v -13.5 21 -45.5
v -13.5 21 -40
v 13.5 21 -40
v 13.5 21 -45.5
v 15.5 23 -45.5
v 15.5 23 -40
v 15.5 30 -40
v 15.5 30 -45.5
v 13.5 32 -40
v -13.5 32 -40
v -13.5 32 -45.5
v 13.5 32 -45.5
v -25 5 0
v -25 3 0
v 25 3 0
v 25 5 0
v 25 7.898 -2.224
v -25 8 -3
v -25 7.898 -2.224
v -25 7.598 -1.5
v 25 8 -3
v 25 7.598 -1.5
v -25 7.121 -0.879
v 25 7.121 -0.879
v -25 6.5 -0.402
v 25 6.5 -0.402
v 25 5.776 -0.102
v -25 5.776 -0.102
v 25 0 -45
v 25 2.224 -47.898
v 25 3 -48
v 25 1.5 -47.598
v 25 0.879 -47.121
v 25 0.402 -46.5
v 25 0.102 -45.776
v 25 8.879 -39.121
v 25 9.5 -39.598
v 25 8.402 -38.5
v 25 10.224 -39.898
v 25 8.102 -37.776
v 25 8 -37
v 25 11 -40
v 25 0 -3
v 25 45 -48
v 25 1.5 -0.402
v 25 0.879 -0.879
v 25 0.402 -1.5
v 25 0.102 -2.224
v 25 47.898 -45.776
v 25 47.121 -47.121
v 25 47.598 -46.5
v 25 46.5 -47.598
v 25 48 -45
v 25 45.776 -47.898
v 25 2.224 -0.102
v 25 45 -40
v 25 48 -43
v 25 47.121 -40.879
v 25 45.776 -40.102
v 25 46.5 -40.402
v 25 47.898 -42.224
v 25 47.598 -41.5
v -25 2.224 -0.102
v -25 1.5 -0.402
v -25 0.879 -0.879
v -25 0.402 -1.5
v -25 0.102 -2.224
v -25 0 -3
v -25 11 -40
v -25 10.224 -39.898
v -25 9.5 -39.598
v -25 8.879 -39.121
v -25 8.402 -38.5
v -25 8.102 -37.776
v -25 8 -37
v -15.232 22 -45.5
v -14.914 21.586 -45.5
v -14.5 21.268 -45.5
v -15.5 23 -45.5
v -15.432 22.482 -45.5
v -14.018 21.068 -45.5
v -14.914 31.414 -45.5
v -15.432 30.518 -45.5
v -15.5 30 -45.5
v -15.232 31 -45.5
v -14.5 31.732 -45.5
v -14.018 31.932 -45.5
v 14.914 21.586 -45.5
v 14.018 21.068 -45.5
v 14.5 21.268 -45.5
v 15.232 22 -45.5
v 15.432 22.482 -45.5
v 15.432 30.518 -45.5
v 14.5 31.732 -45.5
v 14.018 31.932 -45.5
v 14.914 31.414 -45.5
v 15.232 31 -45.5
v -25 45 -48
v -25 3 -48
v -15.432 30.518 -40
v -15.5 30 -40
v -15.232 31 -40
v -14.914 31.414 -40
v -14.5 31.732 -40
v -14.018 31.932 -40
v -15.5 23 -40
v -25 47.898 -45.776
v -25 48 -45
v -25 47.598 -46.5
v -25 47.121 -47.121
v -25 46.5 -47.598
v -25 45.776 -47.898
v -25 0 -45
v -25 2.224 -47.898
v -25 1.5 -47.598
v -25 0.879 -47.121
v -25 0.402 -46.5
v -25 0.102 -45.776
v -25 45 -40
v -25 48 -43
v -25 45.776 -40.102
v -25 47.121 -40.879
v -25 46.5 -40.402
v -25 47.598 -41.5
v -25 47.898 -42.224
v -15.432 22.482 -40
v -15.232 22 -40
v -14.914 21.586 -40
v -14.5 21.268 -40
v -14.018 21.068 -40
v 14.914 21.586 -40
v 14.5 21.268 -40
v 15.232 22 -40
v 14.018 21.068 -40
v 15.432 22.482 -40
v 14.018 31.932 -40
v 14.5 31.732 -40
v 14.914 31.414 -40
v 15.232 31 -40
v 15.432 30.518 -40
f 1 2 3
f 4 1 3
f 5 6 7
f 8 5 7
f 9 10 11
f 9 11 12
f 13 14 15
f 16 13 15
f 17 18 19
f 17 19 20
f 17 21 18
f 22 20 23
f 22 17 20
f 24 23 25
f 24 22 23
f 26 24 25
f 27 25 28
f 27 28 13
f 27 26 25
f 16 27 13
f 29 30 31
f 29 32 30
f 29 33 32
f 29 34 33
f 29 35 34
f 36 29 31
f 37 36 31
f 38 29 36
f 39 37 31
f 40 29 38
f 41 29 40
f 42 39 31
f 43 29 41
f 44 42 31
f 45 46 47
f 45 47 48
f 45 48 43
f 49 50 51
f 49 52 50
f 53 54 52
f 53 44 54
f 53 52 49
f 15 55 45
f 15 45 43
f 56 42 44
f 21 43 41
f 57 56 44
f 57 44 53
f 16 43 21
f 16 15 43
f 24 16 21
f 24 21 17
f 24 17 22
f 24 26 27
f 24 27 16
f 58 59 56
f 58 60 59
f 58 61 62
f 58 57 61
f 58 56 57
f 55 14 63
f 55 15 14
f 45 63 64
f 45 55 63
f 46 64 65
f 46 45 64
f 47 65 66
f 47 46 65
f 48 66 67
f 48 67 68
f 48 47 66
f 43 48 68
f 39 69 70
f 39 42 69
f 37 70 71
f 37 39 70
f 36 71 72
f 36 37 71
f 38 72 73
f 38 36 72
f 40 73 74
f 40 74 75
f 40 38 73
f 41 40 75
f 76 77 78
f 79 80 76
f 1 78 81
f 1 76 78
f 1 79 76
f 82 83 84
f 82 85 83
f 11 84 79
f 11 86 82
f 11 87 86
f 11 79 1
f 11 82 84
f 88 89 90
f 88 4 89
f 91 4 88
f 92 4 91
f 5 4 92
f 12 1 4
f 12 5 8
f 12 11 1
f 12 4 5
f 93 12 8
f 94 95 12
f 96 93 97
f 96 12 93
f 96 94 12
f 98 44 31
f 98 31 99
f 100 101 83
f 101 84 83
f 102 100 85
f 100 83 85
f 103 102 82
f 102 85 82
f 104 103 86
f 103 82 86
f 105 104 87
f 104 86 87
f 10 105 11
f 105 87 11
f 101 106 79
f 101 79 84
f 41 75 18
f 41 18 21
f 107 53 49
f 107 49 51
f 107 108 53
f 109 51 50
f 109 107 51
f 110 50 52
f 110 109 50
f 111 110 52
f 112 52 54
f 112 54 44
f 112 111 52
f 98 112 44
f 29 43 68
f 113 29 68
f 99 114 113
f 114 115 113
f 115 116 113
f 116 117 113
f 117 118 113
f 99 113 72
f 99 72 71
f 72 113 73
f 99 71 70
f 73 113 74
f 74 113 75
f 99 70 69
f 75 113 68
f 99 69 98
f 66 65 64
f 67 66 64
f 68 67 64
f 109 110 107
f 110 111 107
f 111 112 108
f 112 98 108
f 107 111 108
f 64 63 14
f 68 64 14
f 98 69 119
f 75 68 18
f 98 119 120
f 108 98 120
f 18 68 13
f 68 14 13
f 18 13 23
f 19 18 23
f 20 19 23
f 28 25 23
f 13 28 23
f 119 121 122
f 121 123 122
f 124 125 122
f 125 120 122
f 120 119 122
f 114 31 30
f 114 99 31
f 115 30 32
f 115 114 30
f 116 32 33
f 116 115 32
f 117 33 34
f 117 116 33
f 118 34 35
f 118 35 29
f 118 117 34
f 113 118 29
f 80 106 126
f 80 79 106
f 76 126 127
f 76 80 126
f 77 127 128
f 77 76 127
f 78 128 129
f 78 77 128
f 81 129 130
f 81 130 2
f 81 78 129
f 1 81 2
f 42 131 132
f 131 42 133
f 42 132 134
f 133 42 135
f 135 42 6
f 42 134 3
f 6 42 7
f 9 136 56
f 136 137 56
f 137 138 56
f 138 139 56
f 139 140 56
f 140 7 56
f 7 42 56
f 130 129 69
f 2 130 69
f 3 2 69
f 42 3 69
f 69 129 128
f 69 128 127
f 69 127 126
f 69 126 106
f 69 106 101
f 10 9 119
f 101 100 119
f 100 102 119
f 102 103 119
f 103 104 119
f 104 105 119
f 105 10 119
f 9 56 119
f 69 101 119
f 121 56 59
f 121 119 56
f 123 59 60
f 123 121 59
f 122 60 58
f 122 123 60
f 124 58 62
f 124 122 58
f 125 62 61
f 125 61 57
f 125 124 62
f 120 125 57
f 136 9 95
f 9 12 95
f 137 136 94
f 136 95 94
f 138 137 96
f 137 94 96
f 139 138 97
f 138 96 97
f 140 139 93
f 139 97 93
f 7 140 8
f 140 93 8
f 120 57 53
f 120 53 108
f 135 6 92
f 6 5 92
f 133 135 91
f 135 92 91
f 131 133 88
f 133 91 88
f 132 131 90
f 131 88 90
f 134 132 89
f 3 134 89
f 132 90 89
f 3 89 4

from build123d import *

# Parameters (mm, degrees)
SKETCH1_W           = 50
SKETCH1_H           = 40
BOSS_EXTRUDE1_DEPTH = 8
SKETCH2_W           = 50
SKETCH2_H           = 48
BOSS_EXTRUDE2_DEPTH = 8
SKETCH3_W           = 31
SKETCH3_H           = 11
CUT_EXTRUDE1_DEPTH  = 5.5
FILLET1_R           = 2
FILLET2_R           = 3


with BuildPart() as part:
    # Sketch1 → Boss-Extrude1 (new body)
    with BuildSketch(Plane(origin=(0, 0, 0), x_dir=(1, 0, 0), z_dir=(0, 1, 0))):
        with Locations((0, 20)):
            Rectangle(SKETCH1_W, SKETCH1_H)
    extrude(amount=BOSS_EXTRUDE1_DEPTH)

    # Sketch2 → Boss-Extrude2 (add)
    with BuildSketch(Plane(origin=(0, 0, -40), x_dir=(-1, 0, 0), z_dir=(0, 0, -1))):
        with Locations((0, 24)):
            Rectangle(SKETCH2_W, SKETCH2_H)
    extrude(amount=BOSS_EXTRUDE2_DEPTH)

    # Sketch3 → Cut-Extrude1 (cut)
    with BuildSketch(Plane.XY.offset(-40)):
        with Locations((0, 26.5)):
            Rectangle(SKETCH3_W, SKETCH3_H)
    extrude(amount=-CUT_EXTRUDE1_DEPTH, mode=Mode.SUBTRACT)

    # Fillet1
    fillet1_edges = [part.edges().sort_by_distance(p)[0] for p in [
        (-15.5, 21, -42.75),
        (-15.5, 32, -42.75),
        (15.5, 32, -42.75),
        (15.5, 21, -42.75),
    ]]
    fillet(fillet1_edges, radius=FILLET1_R)

    # Fillet2
    fillet2_edges = [part.edges().sort_by_distance(p)[0] for p in [
        (0, 48, -40),
        (0, 0, -48),
        (0, 8, -40),
        (0, 48, -48),
        (0, 0, 0),
        (0, 8, 0),
    ]]
    fillet(fillet2_edges, radius=FILLET2_R)


solid = part.part
